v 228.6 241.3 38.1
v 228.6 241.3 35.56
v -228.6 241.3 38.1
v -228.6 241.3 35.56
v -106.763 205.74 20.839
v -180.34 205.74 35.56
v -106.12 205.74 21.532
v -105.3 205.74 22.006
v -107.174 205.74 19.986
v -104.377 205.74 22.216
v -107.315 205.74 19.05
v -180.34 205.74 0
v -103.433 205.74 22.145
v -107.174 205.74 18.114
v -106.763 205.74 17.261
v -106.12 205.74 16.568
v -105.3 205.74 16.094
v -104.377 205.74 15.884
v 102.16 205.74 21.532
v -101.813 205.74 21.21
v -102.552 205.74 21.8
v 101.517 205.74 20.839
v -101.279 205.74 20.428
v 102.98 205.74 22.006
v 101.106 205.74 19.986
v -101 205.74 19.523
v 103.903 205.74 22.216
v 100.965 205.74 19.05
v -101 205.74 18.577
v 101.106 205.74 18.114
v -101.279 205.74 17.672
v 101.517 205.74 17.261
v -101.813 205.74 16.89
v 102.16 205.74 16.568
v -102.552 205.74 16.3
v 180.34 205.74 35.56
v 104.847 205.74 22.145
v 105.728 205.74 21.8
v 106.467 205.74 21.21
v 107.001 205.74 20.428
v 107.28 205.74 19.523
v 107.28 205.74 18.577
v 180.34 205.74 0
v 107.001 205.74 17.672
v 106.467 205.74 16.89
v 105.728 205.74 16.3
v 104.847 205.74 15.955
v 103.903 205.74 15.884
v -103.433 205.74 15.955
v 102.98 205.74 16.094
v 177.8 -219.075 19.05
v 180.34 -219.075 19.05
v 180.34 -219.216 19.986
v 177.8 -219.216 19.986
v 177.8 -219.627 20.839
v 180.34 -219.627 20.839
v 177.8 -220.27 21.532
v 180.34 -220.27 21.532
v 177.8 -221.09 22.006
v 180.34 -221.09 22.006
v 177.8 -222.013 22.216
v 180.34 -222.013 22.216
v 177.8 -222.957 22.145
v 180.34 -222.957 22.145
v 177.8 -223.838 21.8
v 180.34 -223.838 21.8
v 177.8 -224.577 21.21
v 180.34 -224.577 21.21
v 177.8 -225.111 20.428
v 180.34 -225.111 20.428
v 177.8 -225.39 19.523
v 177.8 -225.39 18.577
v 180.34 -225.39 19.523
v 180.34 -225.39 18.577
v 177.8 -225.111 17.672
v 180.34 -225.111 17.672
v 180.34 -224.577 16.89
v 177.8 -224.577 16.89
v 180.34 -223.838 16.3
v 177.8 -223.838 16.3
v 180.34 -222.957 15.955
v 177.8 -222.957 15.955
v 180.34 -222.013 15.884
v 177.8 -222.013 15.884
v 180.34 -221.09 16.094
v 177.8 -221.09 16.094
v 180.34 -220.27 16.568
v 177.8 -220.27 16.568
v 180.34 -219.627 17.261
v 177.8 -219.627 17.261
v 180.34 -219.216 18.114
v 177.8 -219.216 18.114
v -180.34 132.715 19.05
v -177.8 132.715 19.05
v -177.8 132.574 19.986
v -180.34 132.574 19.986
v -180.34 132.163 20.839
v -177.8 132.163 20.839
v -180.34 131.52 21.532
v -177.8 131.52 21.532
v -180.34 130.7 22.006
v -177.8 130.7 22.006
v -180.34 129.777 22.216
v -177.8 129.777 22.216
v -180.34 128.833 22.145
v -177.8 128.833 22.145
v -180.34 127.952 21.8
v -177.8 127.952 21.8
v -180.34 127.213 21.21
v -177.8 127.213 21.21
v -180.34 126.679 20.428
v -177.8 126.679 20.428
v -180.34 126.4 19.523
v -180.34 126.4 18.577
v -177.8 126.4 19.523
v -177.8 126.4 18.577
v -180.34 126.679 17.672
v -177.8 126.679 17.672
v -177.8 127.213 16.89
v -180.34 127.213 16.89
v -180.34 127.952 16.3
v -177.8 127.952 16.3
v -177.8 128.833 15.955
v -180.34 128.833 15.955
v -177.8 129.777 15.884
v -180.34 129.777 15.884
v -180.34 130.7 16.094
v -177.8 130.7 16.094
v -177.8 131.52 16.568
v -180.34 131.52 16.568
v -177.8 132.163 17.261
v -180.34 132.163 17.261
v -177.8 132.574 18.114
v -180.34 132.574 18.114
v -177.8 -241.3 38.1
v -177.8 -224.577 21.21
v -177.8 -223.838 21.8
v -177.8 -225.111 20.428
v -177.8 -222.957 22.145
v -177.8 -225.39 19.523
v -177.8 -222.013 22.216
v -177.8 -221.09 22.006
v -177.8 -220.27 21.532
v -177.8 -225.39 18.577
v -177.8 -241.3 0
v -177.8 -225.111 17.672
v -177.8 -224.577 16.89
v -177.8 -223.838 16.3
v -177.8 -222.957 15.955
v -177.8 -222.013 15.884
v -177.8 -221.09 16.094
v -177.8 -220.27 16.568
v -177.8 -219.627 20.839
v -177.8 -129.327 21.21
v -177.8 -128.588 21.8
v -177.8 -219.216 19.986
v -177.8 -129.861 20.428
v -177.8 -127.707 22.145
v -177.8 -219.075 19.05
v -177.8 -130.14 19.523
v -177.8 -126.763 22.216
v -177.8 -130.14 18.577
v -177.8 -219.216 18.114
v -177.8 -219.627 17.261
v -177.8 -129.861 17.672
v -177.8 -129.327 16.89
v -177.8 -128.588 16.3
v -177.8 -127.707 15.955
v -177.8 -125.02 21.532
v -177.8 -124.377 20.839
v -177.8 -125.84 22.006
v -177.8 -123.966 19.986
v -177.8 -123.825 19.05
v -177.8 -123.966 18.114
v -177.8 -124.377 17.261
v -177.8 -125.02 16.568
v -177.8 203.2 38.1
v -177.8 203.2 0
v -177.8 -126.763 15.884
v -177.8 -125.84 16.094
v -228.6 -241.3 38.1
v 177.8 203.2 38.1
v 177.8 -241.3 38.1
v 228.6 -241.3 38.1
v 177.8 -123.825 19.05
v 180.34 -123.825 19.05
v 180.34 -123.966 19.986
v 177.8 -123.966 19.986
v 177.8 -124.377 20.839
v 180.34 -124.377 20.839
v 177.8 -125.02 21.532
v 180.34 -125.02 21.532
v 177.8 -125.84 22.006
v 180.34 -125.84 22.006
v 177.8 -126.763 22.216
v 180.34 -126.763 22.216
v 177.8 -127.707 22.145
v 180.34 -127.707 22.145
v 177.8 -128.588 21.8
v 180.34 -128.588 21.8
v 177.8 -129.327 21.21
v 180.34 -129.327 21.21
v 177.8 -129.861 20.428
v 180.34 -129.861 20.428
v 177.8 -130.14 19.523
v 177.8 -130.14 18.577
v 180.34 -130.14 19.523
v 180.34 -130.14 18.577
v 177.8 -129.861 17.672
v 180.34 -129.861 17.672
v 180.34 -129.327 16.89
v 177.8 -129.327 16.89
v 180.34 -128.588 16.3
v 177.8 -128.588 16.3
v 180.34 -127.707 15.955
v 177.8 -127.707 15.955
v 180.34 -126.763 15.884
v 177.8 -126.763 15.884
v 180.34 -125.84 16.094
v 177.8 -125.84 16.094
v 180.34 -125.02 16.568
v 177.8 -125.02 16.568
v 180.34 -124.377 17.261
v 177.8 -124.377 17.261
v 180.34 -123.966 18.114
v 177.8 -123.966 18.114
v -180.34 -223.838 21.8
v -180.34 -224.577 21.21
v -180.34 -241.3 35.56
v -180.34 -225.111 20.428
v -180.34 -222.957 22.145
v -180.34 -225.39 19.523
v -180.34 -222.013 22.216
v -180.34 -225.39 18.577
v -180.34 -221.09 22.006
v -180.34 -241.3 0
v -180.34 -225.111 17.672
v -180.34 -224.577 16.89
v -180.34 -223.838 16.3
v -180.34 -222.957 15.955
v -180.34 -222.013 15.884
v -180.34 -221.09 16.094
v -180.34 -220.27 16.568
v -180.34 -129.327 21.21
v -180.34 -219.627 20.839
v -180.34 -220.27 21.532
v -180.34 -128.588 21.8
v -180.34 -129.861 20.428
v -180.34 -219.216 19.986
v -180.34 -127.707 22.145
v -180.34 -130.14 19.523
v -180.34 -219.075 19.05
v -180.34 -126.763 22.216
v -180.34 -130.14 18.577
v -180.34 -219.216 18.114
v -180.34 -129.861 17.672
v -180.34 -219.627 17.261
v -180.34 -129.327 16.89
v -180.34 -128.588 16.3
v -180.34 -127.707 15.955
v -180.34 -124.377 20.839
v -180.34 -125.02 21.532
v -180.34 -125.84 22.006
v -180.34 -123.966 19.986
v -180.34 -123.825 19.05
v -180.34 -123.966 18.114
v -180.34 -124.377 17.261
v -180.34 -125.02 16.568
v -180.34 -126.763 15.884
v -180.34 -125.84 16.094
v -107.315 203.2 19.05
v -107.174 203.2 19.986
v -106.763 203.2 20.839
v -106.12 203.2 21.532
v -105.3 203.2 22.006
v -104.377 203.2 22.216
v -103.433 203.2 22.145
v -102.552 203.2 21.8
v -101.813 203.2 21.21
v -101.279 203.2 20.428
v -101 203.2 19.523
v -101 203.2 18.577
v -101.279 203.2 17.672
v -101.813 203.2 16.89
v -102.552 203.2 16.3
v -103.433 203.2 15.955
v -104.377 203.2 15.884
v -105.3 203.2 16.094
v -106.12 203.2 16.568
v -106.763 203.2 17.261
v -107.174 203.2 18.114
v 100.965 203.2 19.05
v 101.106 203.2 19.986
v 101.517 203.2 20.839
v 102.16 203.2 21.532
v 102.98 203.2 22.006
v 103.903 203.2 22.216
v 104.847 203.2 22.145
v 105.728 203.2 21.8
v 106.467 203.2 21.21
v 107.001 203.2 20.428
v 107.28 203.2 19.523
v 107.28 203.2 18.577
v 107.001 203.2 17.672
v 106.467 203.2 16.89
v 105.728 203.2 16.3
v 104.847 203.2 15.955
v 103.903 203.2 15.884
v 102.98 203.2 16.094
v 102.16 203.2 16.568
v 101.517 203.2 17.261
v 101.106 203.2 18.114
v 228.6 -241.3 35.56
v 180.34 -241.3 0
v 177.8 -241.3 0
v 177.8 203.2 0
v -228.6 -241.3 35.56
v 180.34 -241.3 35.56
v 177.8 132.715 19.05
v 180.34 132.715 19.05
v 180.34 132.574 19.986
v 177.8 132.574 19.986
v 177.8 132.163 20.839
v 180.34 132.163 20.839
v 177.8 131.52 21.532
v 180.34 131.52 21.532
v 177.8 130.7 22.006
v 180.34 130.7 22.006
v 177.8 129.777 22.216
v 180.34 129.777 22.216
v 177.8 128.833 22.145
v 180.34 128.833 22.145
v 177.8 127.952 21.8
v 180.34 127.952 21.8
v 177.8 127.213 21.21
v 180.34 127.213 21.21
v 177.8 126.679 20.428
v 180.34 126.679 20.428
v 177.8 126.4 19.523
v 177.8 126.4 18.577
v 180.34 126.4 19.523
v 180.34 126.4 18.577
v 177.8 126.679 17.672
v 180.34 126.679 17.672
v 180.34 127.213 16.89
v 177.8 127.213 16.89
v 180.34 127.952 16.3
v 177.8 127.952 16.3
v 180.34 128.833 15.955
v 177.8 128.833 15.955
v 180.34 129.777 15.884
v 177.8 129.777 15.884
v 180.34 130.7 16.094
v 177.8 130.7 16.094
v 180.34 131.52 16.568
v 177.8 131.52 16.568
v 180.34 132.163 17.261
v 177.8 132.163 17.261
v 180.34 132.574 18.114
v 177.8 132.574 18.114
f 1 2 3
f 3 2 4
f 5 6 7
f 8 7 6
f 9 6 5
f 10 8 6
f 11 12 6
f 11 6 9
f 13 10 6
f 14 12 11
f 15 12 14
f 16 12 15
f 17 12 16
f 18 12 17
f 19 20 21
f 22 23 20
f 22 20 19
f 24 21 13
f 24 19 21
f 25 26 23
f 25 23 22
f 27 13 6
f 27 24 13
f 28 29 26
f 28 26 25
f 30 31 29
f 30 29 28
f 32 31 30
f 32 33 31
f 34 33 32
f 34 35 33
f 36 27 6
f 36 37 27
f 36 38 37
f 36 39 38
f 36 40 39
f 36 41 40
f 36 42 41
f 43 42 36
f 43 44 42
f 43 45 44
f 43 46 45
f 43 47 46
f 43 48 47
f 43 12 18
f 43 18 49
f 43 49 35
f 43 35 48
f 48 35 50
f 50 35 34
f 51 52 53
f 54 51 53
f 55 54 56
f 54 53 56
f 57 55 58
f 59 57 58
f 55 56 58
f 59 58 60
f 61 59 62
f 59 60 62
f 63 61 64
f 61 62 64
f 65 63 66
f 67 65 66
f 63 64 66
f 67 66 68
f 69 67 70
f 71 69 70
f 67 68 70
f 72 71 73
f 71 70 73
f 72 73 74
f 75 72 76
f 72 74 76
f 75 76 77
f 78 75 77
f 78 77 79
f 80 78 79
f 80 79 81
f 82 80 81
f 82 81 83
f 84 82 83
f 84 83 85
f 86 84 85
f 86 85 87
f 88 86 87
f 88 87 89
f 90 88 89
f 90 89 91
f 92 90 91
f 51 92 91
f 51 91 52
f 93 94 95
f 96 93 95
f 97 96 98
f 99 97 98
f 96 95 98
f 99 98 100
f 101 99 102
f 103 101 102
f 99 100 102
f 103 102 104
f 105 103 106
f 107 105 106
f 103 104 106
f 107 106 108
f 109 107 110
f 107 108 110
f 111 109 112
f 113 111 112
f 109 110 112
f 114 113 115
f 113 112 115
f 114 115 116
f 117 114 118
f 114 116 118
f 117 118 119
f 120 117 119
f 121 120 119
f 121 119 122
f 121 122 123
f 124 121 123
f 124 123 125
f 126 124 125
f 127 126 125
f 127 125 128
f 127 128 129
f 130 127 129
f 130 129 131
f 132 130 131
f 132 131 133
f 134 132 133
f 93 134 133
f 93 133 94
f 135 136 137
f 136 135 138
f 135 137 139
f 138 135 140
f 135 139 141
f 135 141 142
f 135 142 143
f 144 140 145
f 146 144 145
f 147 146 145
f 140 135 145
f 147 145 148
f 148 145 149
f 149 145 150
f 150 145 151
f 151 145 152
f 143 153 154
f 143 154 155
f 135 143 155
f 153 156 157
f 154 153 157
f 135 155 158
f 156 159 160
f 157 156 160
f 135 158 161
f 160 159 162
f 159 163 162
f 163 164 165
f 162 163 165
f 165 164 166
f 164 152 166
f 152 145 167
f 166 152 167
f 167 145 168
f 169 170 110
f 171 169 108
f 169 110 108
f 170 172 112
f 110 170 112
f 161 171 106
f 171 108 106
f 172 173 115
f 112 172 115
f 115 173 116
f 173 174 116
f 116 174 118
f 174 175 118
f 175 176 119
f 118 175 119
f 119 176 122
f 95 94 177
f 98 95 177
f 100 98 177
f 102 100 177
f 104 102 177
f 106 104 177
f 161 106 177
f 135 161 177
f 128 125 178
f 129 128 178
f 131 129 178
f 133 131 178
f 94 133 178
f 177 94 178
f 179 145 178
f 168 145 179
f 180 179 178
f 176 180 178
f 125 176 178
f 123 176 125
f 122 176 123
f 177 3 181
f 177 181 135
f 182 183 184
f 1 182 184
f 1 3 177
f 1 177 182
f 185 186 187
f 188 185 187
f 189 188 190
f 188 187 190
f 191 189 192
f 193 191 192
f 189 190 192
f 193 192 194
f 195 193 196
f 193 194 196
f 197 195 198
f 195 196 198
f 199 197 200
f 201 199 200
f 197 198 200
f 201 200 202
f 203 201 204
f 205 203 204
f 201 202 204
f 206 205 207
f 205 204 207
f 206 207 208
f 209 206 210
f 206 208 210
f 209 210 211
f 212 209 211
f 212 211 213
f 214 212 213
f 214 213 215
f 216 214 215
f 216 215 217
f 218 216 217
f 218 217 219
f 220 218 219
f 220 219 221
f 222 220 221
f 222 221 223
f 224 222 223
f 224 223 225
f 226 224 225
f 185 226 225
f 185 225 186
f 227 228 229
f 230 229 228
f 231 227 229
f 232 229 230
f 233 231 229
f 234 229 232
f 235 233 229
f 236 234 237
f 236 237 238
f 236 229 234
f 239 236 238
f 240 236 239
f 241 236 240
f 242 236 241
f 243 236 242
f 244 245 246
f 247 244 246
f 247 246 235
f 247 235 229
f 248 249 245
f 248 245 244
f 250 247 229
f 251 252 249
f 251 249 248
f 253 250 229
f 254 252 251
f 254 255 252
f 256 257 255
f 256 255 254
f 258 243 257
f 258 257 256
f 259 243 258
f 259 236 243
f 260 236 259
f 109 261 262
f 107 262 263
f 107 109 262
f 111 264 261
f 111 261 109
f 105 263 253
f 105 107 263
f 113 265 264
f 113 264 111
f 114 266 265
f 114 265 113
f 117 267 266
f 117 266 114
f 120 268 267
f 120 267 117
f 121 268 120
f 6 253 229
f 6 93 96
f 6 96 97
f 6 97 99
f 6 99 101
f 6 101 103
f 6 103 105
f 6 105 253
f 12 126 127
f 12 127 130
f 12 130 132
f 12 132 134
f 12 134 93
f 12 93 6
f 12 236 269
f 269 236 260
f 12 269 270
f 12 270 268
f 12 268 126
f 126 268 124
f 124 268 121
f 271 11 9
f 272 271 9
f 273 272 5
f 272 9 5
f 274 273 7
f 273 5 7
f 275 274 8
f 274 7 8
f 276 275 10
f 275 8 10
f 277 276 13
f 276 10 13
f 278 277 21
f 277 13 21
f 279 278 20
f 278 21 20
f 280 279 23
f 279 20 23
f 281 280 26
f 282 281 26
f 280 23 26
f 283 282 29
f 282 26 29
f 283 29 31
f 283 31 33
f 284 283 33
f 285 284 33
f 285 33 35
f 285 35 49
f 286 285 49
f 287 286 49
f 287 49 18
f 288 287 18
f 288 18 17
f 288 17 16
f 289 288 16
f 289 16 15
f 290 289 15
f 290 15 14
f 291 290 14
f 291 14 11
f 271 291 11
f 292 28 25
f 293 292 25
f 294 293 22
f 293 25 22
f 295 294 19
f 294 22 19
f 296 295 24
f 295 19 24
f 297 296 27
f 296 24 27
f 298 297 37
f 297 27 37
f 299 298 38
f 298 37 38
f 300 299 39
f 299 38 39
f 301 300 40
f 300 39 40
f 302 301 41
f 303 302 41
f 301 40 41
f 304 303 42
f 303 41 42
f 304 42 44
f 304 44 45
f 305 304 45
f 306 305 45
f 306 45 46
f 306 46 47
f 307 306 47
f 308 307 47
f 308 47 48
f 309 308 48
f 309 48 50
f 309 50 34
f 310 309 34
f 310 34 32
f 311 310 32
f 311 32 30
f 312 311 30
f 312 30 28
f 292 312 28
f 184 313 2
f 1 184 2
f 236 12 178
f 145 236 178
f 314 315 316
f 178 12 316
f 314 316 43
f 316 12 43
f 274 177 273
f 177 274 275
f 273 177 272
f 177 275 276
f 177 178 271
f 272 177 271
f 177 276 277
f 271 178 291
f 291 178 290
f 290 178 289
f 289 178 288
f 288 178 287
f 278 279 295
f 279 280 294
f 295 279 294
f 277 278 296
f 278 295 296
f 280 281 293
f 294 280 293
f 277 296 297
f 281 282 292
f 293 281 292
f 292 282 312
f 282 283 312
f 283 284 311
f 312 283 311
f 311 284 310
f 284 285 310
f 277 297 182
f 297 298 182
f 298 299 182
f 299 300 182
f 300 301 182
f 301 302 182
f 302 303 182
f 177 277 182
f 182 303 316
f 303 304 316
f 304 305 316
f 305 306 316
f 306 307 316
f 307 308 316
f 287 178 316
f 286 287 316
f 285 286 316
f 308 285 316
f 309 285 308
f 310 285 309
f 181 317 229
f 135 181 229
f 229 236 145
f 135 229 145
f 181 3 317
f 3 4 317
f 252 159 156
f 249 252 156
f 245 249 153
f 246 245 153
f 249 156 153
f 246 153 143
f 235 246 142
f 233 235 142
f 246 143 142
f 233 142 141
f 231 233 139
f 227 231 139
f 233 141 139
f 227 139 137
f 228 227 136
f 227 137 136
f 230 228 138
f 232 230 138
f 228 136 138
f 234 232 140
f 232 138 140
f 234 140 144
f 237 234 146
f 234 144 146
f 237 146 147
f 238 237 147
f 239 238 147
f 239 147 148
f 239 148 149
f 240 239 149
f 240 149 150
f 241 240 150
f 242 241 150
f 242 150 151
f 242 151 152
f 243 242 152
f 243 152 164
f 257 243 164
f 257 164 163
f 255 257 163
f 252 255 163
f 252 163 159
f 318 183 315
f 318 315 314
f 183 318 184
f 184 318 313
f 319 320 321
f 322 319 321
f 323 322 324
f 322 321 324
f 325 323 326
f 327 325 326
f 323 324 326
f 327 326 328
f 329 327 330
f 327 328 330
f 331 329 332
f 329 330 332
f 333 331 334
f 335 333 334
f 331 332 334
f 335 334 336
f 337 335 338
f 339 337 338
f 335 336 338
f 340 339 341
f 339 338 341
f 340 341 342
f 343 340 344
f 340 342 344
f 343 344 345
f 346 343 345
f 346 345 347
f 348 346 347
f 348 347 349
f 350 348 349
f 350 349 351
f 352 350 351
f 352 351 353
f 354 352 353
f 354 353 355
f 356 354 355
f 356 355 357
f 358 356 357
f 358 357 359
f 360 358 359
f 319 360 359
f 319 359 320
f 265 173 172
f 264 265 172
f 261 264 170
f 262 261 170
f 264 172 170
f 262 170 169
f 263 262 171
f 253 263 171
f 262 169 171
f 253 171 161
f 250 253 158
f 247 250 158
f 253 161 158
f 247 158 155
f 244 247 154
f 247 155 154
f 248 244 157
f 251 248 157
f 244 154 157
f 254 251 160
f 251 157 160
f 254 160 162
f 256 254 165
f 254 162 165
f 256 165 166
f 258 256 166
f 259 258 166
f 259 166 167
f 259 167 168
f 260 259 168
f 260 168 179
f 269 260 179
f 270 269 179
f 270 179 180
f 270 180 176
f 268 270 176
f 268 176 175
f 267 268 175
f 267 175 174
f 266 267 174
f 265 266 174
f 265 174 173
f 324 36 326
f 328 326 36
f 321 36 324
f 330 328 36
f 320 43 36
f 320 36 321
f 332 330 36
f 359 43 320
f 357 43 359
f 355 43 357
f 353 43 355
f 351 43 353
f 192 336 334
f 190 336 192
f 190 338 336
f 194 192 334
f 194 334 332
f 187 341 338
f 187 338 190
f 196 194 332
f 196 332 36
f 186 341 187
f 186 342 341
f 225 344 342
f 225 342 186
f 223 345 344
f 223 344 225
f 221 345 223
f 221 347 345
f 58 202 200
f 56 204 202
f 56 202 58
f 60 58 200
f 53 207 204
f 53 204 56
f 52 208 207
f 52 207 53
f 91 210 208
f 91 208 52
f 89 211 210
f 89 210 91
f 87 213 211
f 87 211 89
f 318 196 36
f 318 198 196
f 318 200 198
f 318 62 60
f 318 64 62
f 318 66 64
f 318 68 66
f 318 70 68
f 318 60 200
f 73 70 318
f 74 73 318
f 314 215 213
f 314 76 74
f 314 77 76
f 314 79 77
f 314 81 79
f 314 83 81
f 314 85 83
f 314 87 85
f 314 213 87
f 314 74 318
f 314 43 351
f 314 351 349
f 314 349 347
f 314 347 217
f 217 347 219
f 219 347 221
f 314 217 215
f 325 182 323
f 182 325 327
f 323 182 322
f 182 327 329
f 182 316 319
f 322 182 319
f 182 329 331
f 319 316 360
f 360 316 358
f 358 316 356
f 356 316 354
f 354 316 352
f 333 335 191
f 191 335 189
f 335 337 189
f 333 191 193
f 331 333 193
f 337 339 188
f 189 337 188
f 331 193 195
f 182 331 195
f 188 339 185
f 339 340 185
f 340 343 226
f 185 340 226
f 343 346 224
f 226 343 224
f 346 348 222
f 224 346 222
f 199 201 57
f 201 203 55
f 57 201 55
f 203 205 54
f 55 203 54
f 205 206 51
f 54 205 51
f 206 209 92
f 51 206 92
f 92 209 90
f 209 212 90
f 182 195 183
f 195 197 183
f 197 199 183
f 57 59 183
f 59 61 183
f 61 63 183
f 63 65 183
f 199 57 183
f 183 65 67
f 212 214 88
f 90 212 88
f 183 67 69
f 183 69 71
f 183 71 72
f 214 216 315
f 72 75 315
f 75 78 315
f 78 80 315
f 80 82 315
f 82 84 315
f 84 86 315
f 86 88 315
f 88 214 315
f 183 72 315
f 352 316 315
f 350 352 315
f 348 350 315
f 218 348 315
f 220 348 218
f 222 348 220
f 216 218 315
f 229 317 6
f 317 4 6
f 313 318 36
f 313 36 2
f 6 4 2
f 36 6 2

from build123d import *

# Parameters (mm, degrees)
F1_DEPTH = 38.1
F2_T     = -2.54
F3_R     = 3.175
F4_DEPTH = 408.941
F5_R     = 3.175
F6_DEPTH = 447.041


with BuildPart() as f1:
    # F0 (on Top) → F1 (new body)
    with BuildSketch(Plane.XY):
        Polygon((-177.8, -241.3), (-177.8, 203.2), (177.8, 203.2), (177.8, -241.3), (228.6, -241.3), (228.6, 241.3), (-228.6, 241.3), (-228.6, -241.3), align=None)
    extrude(amount=F1_DEPTH)

    # F2
    f2_openings = [f1.faces().sort_by_distance(p)[0] for p in [
        (-184.447816, -19.05, 0),
        (-228.6, 0, 19.05),
        (0, 241.3, 19.05),
        (228.6, 0, 19.05),
        (203.2, -241.3, 19.05),
        (-203.2, -241.3, 19.05),
    ]]
    offset(amount=F2_T, openings=f2_openings, kind=Kind.INTERSECTION)

    # F3 (on face) → F4 (cut, through all)
    with BuildSketch(Plane.YZ.offset(180.34)):
        with Locations((-222.25, 19.05)):
            Circle(F3_R)
        with Locations((-127, 19.05)):
            Circle(F3_R)
        with Locations((129.54, 19.05)):
            Circle(F3_R)
    extrude(amount=-F4_DEPTH, mode=Mode.SUBTRACT)

    # F5 (on face) → F6 (cut, through all)
    with BuildSketch(Plane(origin=(0, 205.74, 0), x_dir=(-1, 0, 0), z_dir=(0, 1, 0))):
        with Locations((-104.14, 19.05)):
            Circle(F5_R)
        with Locations((104.14, 19.05)):
            Circle(F5_R)
    extrude(amount=-F6_DEPTH, mode=Mode.SUBTRACT)


solid = f1.part
